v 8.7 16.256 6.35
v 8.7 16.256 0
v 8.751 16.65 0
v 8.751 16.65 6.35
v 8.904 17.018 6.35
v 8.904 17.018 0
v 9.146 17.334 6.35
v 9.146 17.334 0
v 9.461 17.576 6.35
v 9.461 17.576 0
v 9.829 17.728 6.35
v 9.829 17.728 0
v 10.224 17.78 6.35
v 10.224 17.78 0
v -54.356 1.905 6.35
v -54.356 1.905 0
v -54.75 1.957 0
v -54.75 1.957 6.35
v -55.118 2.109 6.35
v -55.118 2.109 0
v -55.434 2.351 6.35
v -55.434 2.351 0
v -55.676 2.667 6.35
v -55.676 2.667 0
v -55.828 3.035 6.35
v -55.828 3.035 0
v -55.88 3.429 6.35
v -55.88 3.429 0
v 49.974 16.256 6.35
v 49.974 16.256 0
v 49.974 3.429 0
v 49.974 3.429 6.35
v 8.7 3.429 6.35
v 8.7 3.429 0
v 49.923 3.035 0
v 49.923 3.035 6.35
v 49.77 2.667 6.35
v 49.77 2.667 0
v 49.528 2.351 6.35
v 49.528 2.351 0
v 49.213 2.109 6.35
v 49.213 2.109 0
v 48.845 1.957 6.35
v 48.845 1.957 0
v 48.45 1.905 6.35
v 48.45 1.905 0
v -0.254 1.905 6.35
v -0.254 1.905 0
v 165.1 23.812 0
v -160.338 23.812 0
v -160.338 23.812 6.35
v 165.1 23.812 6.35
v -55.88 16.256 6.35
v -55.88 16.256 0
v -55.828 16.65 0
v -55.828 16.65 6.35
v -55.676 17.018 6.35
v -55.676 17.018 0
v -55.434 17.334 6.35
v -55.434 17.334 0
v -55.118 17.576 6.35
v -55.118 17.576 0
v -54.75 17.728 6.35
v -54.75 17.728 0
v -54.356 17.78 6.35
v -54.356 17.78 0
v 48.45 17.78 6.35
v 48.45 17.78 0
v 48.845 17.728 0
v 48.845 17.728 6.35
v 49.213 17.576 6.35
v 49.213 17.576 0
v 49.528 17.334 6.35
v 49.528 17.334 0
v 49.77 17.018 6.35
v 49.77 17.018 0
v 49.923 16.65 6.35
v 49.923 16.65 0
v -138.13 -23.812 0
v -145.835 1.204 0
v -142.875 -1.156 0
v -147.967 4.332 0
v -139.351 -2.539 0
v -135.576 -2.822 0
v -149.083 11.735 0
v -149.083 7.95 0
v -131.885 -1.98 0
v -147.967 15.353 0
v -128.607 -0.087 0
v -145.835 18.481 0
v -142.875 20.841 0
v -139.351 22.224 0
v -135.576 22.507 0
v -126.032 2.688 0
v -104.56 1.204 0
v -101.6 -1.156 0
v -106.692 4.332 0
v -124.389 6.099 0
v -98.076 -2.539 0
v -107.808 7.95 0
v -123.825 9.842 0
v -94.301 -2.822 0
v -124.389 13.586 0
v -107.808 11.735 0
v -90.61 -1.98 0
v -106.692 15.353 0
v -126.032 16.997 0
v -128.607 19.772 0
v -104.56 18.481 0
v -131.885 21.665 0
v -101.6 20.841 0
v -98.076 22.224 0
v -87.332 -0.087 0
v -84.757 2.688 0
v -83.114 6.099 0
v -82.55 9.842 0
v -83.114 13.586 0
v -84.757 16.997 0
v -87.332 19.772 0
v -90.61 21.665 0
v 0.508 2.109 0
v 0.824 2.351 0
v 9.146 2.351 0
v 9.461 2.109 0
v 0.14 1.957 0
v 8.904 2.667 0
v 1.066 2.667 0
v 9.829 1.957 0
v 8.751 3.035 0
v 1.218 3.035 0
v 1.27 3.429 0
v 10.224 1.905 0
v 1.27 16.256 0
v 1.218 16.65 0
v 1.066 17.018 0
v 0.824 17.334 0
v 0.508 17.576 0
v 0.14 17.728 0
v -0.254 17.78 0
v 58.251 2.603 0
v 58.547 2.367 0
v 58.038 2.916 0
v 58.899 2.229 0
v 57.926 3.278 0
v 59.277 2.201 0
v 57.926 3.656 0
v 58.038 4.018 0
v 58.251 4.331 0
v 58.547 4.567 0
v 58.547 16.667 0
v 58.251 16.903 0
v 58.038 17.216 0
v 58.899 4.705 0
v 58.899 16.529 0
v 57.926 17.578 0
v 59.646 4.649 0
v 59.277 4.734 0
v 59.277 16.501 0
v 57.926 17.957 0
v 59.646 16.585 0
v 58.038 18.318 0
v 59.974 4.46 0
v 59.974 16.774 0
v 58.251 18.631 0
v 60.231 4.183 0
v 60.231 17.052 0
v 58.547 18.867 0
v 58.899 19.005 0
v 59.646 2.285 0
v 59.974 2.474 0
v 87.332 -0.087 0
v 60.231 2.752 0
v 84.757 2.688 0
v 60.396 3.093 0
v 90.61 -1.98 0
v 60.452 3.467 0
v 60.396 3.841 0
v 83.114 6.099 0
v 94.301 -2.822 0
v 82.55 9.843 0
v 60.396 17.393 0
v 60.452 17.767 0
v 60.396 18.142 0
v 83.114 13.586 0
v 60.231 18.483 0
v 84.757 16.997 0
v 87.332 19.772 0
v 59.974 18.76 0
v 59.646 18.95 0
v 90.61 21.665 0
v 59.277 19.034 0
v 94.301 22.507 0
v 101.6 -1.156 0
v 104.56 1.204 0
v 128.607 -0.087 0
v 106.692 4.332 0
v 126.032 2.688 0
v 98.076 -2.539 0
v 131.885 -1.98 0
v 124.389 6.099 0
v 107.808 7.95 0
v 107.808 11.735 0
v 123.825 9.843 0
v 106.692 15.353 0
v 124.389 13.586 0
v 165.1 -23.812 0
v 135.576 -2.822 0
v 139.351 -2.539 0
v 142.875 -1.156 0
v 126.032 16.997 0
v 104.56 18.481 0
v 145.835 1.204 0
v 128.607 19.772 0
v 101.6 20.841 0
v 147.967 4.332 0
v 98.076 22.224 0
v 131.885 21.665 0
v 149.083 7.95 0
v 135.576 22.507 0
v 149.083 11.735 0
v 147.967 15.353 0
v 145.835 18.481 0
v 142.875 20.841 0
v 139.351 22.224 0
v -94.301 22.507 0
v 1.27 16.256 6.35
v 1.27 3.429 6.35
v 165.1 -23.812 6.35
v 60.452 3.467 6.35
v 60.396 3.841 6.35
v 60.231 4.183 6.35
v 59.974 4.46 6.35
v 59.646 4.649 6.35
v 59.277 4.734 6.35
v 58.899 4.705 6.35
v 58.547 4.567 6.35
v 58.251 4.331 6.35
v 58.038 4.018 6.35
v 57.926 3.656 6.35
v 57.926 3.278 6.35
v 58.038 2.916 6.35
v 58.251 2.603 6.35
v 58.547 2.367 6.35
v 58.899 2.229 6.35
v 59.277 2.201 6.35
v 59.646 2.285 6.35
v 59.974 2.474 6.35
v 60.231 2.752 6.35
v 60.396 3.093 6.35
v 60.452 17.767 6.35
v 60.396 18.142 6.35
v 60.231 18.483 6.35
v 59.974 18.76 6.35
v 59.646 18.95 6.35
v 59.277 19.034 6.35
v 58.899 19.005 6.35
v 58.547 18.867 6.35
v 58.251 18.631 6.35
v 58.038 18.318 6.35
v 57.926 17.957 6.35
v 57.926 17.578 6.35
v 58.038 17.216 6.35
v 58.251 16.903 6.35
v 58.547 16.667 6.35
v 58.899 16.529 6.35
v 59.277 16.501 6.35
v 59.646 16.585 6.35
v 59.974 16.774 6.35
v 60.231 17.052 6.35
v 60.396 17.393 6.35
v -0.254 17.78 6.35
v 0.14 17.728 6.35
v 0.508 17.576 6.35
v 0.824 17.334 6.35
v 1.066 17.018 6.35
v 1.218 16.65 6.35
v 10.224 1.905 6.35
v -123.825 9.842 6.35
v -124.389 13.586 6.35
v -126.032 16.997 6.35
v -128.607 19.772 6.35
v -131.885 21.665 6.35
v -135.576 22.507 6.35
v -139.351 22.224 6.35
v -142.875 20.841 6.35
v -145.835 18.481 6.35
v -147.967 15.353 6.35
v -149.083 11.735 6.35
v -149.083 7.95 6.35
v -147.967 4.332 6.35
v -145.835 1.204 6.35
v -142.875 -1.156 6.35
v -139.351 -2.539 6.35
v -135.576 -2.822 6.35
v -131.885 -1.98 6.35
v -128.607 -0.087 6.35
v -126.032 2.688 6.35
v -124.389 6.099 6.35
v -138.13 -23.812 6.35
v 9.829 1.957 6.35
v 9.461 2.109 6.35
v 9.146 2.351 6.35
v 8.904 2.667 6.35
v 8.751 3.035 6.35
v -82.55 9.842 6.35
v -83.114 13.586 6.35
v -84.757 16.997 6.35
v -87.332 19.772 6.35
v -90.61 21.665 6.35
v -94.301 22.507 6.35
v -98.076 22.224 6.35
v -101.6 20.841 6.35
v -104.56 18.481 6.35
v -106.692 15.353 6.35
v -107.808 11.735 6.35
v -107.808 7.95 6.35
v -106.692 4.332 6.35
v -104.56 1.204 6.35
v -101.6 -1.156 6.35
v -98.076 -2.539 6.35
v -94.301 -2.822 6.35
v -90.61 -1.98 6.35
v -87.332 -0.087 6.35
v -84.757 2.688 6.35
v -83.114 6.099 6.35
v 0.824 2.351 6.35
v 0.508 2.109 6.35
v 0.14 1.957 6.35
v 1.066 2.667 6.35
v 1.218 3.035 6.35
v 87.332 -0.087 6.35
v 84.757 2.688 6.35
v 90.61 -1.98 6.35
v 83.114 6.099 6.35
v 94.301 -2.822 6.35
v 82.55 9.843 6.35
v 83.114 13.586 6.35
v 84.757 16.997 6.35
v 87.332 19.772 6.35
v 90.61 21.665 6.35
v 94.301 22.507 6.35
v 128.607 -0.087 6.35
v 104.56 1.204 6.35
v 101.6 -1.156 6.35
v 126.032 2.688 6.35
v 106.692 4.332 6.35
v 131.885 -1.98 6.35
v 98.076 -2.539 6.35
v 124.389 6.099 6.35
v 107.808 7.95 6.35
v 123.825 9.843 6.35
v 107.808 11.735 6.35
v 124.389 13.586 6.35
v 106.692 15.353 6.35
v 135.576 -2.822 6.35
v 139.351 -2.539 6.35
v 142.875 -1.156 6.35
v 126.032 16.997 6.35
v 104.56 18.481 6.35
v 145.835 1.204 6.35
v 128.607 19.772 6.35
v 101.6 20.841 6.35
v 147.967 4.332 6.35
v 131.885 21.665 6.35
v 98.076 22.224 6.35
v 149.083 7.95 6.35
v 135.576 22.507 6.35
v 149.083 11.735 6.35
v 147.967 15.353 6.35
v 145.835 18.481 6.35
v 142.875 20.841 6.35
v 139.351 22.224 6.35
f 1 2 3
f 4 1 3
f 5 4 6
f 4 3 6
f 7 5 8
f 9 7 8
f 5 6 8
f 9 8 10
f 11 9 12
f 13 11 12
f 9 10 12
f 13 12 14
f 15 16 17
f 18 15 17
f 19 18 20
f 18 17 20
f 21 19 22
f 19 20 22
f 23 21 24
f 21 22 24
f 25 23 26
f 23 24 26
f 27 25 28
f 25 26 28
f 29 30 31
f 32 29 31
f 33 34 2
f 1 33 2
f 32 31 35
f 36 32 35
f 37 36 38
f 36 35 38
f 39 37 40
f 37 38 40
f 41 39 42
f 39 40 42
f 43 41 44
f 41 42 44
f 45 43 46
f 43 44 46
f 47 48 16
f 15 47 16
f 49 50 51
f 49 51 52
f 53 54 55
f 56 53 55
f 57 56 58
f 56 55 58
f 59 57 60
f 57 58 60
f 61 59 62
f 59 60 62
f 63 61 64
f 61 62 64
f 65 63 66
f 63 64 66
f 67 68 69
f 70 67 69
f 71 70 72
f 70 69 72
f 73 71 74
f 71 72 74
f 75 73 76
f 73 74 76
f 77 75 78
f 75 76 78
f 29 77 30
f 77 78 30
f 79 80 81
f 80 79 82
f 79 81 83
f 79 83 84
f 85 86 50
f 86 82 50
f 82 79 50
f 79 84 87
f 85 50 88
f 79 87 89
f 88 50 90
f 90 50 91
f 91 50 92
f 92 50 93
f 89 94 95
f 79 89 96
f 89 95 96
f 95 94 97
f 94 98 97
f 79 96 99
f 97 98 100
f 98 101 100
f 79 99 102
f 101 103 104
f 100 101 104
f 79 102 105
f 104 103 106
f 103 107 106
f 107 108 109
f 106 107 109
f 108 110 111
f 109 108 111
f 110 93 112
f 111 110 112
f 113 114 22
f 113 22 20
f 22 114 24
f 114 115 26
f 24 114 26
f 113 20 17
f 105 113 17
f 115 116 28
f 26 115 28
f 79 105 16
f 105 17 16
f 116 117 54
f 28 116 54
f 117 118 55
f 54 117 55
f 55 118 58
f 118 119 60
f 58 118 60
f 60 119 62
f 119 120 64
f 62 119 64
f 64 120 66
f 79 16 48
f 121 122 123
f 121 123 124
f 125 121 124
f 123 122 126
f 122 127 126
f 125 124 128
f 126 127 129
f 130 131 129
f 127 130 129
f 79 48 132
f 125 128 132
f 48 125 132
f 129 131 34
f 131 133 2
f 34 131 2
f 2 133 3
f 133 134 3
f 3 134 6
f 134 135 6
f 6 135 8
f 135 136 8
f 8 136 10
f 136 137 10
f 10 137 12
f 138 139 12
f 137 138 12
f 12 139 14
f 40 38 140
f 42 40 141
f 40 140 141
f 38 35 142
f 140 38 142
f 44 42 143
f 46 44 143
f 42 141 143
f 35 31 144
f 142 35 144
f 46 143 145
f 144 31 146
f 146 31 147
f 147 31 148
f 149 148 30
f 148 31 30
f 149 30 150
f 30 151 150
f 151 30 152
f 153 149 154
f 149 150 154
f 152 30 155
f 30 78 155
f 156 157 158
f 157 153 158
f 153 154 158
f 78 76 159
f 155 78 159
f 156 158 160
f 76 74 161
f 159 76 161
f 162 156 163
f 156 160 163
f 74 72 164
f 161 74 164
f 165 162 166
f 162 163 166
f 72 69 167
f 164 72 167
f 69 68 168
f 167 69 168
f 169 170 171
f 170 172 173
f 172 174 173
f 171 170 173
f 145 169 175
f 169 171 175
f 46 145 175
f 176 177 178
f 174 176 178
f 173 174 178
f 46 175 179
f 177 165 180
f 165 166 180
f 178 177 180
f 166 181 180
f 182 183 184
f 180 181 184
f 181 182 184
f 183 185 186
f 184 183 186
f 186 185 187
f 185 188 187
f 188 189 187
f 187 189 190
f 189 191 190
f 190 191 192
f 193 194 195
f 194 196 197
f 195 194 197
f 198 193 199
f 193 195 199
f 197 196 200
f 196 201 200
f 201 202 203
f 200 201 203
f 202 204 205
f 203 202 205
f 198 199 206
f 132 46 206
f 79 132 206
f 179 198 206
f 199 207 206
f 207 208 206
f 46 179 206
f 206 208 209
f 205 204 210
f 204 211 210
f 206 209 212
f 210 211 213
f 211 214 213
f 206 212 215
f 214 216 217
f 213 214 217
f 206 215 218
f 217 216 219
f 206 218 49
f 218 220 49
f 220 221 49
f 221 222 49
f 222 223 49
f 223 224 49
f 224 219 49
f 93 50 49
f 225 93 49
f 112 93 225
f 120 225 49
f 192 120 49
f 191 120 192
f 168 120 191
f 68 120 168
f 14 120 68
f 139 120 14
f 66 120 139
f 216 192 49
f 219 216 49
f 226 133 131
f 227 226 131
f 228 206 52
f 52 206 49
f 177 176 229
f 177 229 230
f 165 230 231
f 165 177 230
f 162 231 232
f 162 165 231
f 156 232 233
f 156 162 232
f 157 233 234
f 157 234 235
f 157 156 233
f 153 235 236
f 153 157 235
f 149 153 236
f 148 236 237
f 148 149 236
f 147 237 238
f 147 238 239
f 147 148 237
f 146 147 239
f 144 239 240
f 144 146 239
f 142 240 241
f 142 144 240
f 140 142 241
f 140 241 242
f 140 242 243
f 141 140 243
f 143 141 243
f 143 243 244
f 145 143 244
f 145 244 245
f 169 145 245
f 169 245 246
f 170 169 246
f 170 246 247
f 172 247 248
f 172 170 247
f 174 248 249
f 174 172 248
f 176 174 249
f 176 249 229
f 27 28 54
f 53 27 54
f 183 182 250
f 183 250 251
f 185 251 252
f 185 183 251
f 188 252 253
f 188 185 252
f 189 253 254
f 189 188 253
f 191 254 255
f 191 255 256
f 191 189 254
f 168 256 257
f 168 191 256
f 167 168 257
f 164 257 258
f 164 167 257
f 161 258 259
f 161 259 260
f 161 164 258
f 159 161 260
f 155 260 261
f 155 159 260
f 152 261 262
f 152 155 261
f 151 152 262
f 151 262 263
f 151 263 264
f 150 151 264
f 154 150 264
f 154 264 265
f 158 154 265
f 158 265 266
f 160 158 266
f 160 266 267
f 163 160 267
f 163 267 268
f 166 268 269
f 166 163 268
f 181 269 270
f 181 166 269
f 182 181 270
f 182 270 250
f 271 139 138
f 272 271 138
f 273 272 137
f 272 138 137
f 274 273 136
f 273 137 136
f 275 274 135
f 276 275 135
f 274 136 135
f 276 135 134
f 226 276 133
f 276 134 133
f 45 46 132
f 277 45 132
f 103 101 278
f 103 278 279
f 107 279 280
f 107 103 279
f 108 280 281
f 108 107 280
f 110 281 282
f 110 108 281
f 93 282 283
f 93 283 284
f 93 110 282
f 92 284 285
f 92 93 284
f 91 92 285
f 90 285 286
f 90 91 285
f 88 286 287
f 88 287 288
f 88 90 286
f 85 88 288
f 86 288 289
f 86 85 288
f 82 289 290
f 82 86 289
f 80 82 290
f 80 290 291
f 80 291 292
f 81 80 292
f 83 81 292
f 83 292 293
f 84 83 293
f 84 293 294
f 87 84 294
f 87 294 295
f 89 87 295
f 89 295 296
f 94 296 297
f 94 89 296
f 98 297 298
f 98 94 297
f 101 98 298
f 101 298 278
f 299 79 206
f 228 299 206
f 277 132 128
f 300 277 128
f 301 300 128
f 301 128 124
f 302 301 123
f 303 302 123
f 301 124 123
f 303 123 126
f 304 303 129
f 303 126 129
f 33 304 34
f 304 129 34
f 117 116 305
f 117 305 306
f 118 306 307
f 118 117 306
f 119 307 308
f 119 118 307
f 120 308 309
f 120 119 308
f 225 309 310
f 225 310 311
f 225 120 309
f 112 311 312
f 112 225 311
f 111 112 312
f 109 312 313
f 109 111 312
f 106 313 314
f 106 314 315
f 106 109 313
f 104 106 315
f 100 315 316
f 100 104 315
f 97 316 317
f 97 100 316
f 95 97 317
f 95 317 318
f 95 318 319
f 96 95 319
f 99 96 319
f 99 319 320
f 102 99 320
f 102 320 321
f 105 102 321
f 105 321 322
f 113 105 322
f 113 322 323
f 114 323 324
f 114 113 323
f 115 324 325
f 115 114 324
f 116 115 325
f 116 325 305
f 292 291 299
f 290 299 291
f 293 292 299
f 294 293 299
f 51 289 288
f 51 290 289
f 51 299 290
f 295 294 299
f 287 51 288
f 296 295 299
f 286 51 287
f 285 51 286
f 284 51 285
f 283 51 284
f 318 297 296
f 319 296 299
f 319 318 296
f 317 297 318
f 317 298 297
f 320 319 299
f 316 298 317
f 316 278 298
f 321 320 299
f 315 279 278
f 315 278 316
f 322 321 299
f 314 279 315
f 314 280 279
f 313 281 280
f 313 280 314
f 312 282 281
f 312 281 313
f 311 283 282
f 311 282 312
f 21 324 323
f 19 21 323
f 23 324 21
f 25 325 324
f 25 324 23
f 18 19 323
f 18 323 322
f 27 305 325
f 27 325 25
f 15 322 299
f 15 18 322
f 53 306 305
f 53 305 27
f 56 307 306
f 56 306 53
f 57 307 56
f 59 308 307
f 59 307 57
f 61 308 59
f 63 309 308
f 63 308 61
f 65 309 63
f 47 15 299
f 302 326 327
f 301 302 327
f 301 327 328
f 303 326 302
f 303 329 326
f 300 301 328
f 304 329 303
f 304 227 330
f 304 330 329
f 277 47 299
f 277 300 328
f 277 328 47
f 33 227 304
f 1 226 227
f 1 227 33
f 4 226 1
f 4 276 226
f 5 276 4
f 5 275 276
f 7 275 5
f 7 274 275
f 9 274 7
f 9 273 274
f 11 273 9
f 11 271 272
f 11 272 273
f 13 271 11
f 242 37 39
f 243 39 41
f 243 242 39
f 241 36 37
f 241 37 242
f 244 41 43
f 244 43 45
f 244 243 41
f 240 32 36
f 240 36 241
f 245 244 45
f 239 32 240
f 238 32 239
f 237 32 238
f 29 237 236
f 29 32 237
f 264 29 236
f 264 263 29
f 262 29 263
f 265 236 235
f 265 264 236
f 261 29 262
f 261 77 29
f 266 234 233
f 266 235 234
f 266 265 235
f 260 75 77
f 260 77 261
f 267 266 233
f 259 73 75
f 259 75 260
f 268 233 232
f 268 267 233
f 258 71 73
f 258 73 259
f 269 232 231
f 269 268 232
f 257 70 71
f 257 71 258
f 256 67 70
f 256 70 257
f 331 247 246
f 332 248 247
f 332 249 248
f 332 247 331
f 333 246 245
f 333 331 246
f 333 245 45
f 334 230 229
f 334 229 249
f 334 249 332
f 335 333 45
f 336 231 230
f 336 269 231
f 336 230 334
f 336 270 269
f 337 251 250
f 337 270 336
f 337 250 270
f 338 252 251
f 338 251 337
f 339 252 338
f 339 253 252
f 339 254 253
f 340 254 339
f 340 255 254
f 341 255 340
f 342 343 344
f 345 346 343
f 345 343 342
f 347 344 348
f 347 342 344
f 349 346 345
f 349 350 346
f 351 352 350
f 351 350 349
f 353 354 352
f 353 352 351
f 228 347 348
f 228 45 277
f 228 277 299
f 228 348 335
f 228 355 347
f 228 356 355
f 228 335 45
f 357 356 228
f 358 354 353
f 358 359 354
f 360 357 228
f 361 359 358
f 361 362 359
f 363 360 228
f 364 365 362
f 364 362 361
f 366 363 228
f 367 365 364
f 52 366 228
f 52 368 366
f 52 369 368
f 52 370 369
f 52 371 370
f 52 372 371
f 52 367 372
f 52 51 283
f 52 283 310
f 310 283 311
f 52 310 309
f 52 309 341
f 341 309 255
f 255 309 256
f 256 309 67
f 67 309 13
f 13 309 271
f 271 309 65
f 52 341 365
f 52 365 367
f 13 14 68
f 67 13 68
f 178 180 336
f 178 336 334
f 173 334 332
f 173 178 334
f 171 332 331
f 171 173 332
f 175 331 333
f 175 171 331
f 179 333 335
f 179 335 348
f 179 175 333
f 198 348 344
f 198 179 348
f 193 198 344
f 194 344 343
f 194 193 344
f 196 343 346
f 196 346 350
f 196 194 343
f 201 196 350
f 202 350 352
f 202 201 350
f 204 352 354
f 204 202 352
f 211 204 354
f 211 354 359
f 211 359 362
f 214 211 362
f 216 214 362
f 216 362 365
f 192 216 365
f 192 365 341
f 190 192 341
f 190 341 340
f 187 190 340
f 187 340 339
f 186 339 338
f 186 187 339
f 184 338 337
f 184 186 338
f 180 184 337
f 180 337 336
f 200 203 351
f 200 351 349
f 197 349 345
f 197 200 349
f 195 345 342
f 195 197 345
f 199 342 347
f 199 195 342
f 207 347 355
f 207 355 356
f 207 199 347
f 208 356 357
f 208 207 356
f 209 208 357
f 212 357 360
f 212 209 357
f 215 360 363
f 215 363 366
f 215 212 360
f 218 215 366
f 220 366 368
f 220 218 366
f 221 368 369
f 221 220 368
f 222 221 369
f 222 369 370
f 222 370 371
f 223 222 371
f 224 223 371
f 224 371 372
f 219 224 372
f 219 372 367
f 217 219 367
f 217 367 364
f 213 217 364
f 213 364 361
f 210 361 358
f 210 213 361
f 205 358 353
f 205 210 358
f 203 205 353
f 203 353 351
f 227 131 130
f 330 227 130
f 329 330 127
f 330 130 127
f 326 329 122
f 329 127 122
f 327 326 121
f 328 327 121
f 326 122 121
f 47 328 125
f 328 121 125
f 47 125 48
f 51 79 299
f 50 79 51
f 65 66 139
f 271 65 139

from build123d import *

# Parameters (mm, degrees)
SKETCH1_W          = 330.2
SKETCH1_H          = 47.625
SKETCH1_R          = 12.7
SKETCH1_R_2        = 1.27
EXTRUDE1_DEPTH     = 6.35
CUT_EXTRUDE1_DEPTH = 167.929229484


with BuildPart() as part:
    # Sketch1 → Extrude1 (new body)
    with BuildSketch(Plane.XY):
        Rectangle(SKETCH1_W, SKETCH1_H)
        with Locations((-136.525, 9.8425)):
            Circle(SKETCH1_R, mode=Mode.SUBTRACT)
        with Locations((-95.25, 9.8425)):
            Circle(SKETCH1_R, mode=Mode.SUBTRACT)
        with Locations(Location((95.25, 9.8425, 0), (0, 0, 180))):
            Circle(SKETCH1_R, mode=Mode.SUBTRACT)
        with Locations(Location((136.525, 9.8425, 0), (0, 0, 180))):
            Circle(SKETCH1_R, mode=Mode.SUBTRACT)
        with Locations((59.182, 17.7673)):
            Circle(SKETCH1_R_2, mode=Mode.SUBTRACT)
        with Locations((59.182, 3.4671)):
            Circle(SKETCH1_R_2, mode=Mode.SUBTRACT)
        with BuildLine():
            Line((-54.356, 17.78), (-0.254, 17.78))
            ThreePointArc((-0.254, 17.78), (0.823630735, 17.333630735), (1.27, 16.256))
            Line((1.27, 16.256), (1.27, 3.429))
            ThreePointArc((1.27, 3.429), (0.823630735, 2.351369265), (-0.254, 1.905))
            Line((-0.254, 1.905), (-54.356, 1.905))
            ThreePointArc((-54.356, 1.905), (-55.433630735, 2.351369265), (-55.88, 3.429))
            Line((-55.88, 3.429), (-55.88, 16.256))
            ThreePointArc((-55.88, 16.256), (-55.433630735, 17.333630735), (-54.356, 17.78))
        make_face(mode=Mode.SUBTRACT)
        with BuildLine():
            Line((10.2235, 17.78), (48.4505, 17.78))
            ThreePointArc((48.4505, 17.78), (49.528130735, 17.333630735), (49.9745, 16.256))
            Line((49.9745, 16.256), (49.9745, 3.429))
            ThreePointArc((49.9745, 3.429), (49.528130735, 2.351369265), (48.4505, 1.905))
            Line((48.4505, 1.905), (10.2235, 1.905))
            ThreePointArc((10.2235, 1.905), (9.145869265, 2.351369265), (8.6995, 3.429))
            Line((8.6995, 3.429), (8.6995, 16.256))
            ThreePointArc((8.6995, 16.256), (9.145869265, 17.333630735), (10.2235, 17.78))
        make_face(mode=Mode.SUBTRACT)
    extrude(amount=EXTRUDE1_DEPTH)

    # Sketch2 → Cut-Extrude1 (cut, through all)
    with BuildSketch(Plane.XY):
        Polygon((-167.77348356, 39.759180653), (-167.77348356, -38.14883308), (-131.444750208, -38.14883308), align=None)
    extrude(amount=CUT_EXTRUDE1_DEPTH, mode=Mode.SUBTRACT)


solid = part.part
